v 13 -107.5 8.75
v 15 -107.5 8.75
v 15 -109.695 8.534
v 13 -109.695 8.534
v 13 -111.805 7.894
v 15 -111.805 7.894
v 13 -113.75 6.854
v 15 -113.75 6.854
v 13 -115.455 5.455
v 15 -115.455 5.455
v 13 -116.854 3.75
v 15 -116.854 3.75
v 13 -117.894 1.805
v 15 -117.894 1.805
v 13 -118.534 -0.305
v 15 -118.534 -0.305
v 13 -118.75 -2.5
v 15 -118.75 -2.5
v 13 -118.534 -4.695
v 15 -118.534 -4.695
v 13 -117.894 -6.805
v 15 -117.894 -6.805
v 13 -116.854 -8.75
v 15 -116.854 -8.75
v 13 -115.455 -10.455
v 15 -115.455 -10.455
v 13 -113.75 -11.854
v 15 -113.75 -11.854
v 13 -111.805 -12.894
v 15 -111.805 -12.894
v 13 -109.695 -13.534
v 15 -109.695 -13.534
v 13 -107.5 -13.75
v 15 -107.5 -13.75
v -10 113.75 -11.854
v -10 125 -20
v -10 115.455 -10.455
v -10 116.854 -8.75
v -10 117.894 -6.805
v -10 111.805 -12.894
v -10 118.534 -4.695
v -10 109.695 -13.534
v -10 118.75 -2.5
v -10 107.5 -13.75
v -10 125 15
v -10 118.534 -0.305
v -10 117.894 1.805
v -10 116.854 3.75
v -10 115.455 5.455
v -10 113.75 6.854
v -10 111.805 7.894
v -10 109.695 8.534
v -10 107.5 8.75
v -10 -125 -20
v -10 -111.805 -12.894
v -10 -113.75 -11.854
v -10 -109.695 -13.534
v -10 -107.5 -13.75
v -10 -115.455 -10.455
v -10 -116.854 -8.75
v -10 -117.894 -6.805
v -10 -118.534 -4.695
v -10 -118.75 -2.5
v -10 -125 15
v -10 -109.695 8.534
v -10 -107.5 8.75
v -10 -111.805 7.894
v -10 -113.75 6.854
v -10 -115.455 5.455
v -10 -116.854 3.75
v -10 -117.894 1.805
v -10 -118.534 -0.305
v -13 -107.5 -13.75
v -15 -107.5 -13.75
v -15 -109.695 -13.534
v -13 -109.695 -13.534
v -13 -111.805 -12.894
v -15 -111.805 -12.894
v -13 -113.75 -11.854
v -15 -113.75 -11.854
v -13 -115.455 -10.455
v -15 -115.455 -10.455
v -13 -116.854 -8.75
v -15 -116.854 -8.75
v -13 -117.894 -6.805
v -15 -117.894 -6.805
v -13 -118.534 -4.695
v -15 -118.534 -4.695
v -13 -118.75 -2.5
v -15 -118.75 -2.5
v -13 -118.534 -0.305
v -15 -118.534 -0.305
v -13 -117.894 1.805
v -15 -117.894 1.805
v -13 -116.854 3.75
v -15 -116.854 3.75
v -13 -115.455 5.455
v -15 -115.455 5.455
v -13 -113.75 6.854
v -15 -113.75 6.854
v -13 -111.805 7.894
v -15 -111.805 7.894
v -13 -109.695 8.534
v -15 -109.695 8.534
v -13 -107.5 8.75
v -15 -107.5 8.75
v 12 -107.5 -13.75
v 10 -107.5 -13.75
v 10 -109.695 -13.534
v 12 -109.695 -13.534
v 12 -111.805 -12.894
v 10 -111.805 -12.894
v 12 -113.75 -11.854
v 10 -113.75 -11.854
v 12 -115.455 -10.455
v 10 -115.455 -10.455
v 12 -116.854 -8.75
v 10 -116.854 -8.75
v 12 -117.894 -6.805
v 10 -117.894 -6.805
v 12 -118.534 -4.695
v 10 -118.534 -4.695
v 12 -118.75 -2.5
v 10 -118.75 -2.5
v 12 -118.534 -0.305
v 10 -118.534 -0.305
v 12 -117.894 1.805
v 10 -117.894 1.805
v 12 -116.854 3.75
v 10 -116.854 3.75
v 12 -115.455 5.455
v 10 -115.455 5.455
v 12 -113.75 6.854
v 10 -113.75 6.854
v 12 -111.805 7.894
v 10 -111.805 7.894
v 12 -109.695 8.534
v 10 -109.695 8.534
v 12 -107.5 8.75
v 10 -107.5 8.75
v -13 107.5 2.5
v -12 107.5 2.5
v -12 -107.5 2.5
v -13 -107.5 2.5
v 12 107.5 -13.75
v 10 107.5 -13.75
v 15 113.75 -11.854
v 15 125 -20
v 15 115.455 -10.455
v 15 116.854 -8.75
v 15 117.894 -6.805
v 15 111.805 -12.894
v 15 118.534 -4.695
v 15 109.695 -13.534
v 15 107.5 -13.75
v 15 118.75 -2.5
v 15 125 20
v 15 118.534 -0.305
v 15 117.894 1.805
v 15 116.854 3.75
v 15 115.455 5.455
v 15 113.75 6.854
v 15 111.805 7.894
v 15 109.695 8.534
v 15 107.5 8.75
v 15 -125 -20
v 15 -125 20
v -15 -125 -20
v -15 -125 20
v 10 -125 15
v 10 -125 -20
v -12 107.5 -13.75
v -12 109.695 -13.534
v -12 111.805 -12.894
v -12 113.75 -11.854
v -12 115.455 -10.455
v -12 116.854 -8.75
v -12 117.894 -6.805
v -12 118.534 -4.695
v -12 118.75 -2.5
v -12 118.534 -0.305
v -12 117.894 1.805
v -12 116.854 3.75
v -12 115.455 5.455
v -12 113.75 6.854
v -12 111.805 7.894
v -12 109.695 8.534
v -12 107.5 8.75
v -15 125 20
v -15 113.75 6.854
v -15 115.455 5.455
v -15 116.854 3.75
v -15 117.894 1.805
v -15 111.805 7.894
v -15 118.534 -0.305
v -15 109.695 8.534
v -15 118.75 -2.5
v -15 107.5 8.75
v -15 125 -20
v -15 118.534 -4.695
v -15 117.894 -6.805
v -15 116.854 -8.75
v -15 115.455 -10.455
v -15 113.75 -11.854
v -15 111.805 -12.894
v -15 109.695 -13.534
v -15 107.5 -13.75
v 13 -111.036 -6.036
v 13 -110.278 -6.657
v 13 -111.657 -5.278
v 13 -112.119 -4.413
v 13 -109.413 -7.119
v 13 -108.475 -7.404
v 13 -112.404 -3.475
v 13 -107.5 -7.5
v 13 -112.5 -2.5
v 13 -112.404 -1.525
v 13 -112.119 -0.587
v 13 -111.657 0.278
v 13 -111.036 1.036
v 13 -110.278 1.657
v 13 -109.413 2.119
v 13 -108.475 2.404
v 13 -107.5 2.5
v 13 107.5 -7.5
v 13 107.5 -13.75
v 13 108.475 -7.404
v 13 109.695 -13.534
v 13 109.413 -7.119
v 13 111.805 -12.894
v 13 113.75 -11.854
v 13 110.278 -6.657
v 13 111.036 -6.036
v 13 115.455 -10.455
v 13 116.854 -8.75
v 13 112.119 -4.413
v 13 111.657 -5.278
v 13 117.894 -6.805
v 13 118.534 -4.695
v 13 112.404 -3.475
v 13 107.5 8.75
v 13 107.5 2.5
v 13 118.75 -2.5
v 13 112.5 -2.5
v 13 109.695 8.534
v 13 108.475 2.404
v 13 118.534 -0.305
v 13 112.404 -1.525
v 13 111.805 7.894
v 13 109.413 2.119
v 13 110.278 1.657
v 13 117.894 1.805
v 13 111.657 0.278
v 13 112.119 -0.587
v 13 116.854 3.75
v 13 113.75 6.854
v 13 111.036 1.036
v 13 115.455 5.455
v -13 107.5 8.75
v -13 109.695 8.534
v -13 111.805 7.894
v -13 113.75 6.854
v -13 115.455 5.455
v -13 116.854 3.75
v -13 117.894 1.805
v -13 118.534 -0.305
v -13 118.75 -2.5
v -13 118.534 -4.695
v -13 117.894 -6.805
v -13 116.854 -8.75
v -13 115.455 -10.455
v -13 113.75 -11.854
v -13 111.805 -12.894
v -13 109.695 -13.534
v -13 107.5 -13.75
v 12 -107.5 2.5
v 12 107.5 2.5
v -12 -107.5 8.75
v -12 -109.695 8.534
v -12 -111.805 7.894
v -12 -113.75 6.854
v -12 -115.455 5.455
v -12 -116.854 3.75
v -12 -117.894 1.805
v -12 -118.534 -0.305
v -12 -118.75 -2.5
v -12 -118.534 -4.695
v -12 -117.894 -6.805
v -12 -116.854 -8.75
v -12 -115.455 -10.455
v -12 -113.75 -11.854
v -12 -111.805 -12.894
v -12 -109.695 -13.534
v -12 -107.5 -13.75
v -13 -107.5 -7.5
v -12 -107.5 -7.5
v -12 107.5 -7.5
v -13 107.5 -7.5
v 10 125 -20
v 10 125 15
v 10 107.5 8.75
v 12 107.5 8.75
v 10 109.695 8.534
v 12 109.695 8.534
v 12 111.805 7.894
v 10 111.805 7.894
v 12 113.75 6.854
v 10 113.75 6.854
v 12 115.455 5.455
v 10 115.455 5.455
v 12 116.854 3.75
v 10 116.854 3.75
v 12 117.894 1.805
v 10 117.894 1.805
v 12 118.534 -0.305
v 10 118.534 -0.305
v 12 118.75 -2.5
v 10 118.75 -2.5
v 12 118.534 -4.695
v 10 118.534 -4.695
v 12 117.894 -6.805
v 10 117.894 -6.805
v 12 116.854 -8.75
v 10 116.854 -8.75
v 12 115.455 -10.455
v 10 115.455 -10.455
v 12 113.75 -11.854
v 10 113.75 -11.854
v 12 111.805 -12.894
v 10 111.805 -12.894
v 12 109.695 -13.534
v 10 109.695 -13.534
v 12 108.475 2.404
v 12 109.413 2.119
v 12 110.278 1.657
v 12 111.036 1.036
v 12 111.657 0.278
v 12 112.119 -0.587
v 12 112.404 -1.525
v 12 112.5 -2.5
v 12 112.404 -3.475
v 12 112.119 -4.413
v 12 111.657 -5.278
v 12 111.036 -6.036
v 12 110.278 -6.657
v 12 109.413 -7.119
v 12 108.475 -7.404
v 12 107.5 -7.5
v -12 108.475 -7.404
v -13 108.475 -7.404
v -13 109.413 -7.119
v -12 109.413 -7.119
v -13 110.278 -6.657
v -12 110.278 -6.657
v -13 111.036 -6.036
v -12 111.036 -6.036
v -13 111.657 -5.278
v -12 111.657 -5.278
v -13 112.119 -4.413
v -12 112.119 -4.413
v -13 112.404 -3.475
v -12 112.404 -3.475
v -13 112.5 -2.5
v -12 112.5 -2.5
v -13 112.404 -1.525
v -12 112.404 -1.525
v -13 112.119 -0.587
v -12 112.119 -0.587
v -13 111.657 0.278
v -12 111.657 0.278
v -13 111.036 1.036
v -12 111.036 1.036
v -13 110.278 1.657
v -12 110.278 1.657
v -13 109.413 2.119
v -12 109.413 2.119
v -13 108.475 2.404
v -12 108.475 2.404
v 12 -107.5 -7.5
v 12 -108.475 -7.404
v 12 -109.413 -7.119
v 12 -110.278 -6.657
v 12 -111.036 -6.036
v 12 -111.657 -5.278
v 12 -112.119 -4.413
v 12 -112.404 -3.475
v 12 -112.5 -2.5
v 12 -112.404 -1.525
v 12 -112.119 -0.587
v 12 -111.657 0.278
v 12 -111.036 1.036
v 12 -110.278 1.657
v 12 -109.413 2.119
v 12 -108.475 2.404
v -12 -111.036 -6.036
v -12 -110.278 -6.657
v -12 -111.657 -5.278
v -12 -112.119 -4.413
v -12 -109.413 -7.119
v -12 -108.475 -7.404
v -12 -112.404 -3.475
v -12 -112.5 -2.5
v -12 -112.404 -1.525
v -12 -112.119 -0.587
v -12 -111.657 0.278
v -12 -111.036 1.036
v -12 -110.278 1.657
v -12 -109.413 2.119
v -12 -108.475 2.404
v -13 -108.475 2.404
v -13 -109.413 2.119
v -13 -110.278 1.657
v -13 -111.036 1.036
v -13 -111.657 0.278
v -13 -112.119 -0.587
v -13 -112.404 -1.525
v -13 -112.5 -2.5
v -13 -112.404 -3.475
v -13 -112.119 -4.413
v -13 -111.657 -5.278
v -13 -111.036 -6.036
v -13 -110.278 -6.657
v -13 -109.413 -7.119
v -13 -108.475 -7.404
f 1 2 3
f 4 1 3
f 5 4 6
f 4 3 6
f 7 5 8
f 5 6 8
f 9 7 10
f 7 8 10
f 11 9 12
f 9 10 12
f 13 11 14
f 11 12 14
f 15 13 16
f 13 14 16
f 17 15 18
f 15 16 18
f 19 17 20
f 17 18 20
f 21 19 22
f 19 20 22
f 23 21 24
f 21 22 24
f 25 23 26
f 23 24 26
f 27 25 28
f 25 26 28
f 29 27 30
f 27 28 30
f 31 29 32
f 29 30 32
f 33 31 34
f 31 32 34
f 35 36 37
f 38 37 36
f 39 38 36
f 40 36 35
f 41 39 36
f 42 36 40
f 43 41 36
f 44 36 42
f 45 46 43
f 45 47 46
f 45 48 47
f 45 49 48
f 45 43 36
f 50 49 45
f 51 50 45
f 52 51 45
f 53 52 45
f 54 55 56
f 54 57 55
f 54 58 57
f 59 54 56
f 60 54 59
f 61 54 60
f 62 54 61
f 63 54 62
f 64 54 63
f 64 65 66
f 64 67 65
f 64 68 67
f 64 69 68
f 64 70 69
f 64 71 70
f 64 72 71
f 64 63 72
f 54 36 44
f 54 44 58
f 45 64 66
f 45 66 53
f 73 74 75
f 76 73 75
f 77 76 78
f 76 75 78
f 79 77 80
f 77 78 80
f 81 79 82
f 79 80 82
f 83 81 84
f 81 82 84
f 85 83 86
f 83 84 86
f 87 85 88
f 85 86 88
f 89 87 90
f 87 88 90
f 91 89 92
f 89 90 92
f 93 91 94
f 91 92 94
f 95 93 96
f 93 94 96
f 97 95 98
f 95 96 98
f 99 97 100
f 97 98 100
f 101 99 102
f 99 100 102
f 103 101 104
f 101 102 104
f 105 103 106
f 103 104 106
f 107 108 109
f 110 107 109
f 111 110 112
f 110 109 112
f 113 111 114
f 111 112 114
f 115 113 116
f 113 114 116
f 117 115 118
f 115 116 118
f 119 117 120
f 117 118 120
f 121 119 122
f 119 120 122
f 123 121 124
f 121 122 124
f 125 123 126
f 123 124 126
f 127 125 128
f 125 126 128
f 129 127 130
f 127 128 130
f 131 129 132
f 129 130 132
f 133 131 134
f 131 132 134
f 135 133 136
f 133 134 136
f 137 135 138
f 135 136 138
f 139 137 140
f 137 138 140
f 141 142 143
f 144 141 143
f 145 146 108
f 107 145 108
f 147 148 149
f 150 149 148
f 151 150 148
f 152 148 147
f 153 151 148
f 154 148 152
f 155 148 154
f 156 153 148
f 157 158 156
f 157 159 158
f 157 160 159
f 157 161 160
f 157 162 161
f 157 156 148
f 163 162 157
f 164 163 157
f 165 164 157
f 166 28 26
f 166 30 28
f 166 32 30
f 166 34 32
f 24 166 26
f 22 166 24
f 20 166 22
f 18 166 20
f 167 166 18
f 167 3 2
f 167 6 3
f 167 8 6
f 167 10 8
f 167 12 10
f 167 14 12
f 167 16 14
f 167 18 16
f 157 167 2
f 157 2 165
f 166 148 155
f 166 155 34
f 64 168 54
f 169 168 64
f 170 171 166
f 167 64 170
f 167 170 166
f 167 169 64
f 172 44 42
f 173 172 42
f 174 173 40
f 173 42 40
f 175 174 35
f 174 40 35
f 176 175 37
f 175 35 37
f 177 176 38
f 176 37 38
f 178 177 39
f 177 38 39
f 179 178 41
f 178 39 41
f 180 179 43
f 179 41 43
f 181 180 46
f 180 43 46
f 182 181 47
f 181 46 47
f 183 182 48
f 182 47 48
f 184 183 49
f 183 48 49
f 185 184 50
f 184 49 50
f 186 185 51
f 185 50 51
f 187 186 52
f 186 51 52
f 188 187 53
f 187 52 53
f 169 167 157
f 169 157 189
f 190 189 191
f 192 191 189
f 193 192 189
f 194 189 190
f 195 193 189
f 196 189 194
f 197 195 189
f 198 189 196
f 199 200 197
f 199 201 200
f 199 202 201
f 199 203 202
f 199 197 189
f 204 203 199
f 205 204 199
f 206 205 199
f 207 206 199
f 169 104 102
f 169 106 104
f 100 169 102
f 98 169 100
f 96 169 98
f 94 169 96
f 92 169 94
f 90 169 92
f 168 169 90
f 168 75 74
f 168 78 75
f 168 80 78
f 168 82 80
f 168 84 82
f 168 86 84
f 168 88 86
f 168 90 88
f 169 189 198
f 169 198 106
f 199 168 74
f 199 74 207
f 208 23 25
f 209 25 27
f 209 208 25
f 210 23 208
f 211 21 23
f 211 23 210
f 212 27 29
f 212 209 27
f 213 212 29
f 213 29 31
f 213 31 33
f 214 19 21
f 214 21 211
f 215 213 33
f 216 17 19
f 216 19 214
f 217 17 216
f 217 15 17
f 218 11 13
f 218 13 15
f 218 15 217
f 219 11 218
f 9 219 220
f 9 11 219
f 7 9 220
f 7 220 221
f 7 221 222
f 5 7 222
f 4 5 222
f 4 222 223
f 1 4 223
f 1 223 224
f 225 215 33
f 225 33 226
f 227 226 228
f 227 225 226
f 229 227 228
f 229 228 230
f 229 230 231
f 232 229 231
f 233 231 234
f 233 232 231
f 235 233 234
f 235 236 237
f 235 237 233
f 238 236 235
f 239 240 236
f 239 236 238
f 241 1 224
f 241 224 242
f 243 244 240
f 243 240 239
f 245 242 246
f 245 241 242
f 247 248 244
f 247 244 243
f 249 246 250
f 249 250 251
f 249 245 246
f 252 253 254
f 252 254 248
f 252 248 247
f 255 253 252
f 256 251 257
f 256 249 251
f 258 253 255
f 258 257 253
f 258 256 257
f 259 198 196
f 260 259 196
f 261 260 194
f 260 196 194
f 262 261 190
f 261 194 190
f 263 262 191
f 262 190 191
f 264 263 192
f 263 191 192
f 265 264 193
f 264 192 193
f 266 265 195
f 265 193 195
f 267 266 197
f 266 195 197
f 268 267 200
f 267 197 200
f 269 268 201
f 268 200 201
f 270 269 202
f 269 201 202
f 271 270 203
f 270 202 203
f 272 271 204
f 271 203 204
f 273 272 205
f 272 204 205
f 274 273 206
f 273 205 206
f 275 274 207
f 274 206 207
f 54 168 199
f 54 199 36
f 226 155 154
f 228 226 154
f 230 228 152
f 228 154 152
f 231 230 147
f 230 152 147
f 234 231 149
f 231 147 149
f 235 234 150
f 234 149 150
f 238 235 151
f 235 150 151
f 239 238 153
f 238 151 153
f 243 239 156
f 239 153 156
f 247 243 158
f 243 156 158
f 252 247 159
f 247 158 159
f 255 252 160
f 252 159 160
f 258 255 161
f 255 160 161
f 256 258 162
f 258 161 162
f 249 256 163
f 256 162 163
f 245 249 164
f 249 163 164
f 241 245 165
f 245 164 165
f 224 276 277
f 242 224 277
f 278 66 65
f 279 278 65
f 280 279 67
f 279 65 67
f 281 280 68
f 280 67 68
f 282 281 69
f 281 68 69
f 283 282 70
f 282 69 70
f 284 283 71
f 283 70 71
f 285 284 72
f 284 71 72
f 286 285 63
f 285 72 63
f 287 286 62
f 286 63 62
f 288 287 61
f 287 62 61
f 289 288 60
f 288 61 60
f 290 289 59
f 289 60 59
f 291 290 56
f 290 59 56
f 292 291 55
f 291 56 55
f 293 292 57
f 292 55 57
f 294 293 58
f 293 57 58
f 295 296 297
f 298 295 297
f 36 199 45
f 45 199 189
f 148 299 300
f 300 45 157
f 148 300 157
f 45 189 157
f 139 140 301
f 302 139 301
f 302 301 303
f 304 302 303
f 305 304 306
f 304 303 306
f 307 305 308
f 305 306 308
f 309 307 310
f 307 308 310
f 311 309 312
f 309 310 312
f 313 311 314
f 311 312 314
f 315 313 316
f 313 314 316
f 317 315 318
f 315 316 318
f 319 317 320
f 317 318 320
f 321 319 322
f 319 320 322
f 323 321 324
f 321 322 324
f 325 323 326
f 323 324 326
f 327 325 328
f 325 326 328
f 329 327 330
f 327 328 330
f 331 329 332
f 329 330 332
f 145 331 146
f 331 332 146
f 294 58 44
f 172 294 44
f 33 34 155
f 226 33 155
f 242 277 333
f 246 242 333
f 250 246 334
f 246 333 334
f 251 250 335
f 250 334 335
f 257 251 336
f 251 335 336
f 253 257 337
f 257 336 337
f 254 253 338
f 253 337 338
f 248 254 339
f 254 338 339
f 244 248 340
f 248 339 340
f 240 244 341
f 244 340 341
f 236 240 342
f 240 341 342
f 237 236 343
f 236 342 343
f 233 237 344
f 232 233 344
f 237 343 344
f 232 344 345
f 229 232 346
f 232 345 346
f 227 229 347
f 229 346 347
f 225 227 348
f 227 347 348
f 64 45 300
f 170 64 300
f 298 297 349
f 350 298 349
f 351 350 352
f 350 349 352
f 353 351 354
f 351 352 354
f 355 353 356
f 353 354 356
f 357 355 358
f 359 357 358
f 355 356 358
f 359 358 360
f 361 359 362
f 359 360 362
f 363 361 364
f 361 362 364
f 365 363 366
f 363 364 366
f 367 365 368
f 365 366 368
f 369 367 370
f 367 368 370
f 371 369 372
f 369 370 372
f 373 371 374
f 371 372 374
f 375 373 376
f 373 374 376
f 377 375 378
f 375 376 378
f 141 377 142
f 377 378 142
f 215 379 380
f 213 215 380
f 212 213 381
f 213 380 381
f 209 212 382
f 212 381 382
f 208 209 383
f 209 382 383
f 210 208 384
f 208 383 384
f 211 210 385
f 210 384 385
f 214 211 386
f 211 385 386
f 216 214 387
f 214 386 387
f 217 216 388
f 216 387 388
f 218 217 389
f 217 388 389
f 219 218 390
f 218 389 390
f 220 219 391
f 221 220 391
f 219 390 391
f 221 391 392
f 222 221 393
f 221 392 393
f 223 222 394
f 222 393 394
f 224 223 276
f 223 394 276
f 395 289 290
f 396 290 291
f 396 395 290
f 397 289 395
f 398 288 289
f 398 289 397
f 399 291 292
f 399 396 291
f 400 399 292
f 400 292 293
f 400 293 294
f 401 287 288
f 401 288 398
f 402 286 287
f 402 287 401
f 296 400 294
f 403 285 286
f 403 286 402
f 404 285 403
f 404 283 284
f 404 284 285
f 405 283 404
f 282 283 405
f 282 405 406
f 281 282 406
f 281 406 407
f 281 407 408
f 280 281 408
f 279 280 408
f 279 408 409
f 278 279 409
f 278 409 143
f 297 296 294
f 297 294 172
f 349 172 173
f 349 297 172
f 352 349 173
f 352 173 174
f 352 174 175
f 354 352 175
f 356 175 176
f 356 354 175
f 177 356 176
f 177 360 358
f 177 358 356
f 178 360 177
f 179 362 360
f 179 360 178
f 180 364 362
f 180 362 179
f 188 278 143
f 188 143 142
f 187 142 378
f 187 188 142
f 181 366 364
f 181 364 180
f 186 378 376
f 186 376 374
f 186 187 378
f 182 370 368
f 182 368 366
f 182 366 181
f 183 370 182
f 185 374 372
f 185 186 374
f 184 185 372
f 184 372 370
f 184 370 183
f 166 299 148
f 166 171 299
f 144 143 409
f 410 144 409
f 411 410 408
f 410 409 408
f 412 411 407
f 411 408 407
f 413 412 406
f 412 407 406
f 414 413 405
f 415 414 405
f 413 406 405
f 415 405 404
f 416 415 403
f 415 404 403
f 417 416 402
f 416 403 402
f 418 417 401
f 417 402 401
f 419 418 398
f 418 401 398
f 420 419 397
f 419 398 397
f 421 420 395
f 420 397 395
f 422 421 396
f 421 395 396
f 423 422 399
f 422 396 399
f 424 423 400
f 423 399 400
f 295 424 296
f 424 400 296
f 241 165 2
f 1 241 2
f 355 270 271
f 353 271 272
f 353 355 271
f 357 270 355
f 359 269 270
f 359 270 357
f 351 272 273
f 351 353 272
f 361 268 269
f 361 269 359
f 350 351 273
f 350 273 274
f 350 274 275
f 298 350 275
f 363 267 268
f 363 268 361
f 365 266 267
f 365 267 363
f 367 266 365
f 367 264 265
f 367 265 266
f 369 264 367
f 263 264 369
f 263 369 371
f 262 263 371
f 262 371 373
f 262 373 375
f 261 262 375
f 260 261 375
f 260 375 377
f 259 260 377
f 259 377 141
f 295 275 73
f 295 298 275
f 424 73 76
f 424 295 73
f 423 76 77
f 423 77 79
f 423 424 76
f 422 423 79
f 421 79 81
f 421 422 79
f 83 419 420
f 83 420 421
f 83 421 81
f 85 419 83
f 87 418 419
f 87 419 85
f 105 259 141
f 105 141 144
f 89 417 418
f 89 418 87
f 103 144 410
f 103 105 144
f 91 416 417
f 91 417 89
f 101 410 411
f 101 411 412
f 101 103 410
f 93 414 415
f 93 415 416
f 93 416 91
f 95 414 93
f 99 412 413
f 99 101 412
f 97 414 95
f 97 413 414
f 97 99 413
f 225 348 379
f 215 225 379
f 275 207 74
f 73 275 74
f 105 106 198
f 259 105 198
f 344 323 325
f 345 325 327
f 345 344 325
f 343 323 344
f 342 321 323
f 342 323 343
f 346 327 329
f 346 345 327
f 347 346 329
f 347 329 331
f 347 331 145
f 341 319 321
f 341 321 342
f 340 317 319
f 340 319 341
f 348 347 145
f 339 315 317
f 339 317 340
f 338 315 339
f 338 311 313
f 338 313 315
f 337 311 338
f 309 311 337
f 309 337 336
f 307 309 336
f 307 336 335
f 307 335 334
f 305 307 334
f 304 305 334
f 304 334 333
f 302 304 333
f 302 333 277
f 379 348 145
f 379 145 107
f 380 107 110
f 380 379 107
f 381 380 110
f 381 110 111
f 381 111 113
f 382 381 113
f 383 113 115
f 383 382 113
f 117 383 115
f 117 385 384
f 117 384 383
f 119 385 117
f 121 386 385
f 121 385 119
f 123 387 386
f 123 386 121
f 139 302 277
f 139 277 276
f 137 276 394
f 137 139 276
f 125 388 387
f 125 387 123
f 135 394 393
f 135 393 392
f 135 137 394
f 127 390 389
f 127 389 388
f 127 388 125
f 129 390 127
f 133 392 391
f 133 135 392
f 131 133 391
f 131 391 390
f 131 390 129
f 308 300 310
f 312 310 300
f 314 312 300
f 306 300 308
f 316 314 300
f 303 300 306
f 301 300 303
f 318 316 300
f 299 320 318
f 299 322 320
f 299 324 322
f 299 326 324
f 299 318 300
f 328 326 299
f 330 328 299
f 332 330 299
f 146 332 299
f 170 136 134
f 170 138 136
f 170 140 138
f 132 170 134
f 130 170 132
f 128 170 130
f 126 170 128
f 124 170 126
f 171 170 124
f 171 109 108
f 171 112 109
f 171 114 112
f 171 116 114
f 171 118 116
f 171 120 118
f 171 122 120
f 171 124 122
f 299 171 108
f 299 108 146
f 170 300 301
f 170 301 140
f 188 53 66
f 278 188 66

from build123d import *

# Parameters (mm, degrees)
F1_DEPTH      = 125
F1_DEPTH_BACK = 125
F6_DEPTH      = 5.001
F7_DEPTH      = 30.001
F8_DEPTH      = 2
F9_DEPTH      = 2
F10_DEPTH     = 2
F11_DEPTH     = 2


with BuildPart() as f1:
    # F0 (on Front) → F1 (new body, two sides)
    with BuildSketch(Plane.XZ) as f1_sk:
        Polygon((15, -20), (15, 20), (-15, 20), (-15, -20), (-10, -20), (-10, 15), (10, 15), (10, -20), align=None)
    extrude(amount=F1_DEPTH)
    extrude(f1_sk.sketch, amount=-F1_DEPTH_BACK)

    # F4 (on face) → F6 (cut, through all)
    with BuildSketch(Plane.YZ.offset(-10)):
        with BuildLine():
            Line((107.5, 2.5), (-107.5, 2.5))
            ThreePointArc((-107.5, 2.5), (-112.5, -2.5), (-107.5, -7.5))
            Line((-107.5, -7.5), (107.5, -7.5))
            ThreePointArc((107.5, -7.5), (112.5, -2.5), (107.5, 2.5))
        make_face()
    extrude(amount=-F6_DEPTH, mode=Mode.SUBTRACT)

    # F2 (on face) → F7 (cut, through all)
    with BuildSketch(Plane(origin=(-15, 0, 0), x_dir=(0, -1, 0), z_dir=(-1, 0, 0))):
        with BuildLine():
            Line((-107.5, -7.5), (107.5, -7.5))
            ThreePointArc((107.5, -7.5), (112.5, -2.5), (107.5, 2.5))
            Line((107.5, 2.5), (-107.5, 2.5))
            ThreePointArc((-107.5, 2.5), (-112.5, -2.5), (-107.5, -7.5))
        make_face()
    extrude(amount=-F7_DEPTH, mode=Mode.SUBTRACT)

    # F5 (on face) → F8 (cut)
    with BuildSketch(Plane(origin=(10, 0, 0), x_dir=(0, -1, 0), z_dir=(-1, 0, 0))):
        with BuildLine():
            Line((107.5, 8.75), (-107.5, 8.75))
            ThreePointArc((-107.5, 8.75), (-118.75, -2.5), (-107.5, -13.75))
            Line((-107.5, -13.75), (107.5, -13.75))
            ThreePointArc((107.5, -13.75), (118.75, -2.5), (107.5, 8.75))
        make_face()
        with BuildLine():
            ThreePointArc((-107.5, -7.5), (-112.5, -2.5), (-107.5, 2.5))
            Line((-107.5, 2.5), (107.5, 2.5))
            ThreePointArc((107.5, 2.5), (112.5, -2.5), (107.5, -7.5))
            Line((107.5, -7.5), (-107.5, -7.5))
        make_face(mode=Mode.SUBTRACT)
    extrude(amount=-F8_DEPTH, mode=Mode.SUBTRACT)

    # F4 (on face) → F9 (cut)
    with BuildSketch(Plane.YZ.offset(-10)):
        with BuildLine():
            Line((107.5, 8.75), (-107.5, 8.75))
            ThreePointArc((-107.5, 8.75), (-118.75, -2.5), (-107.5, -13.75))
            Line((-107.5, -13.75), (107.5, -13.75))
            ThreePointArc((107.5, -13.75), (118.75, -2.5), (107.5, 8.75))
        make_face()
        with BuildLine():
            ThreePointArc((-107.5, -7.5), (-112.5, -2.5), (-107.5, 2.5))
            Line((-107.5, 2.5), (107.5, 2.5))
            ThreePointArc((107.5, 2.5), (112.5, -2.5), (107.5, -7.5))
            Line((107.5, -7.5), (-107.5, -7.5))
        make_face(mode=Mode.SUBTRACT)
    extrude(amount=-F9_DEPTH, mode=Mode.SUBTRACT)

    # F3 (on face) → F10 (cut)
    with BuildSketch(Plane.YZ.offset(15)):
        with BuildLine():
            ThreePointArc((-107.5, 8.75), (-118.75, -2.5), (-107.5, -13.75))
            Line((-107.5, -13.75), (107.5, -13.75))
            ThreePointArc((107.5, -13.75), (118.75, -2.5), (107.5, 8.75))
            Line((107.5, 8.75), (-107.5, 8.75))
        make_face()
        with BuildLine():
            ThreePointArc((-107.5, -7.5), (-112.5, -2.5), (-107.5, 2.5))
            Line((-107.5, 2.5), (107.5, 2.5))
            ThreePointArc((107.5, 2.5), (112.5, -2.5), (107.5, -7.5))
            Line((107.5, -7.5), (-107.5, -7.5))
        make_face(mode=Mode.SUBTRACT)
    extrude(amount=-F10_DEPTH, mode=Mode.SUBTRACT)

    # F2 (on face) → F11 (cut)
    with BuildSketch(Plane(origin=(-15, 0, 0), x_dir=(0, -1, 0), z_dir=(-1, 0, 0))):
        with BuildLine():
            Line((-107.5, -13.75), (107.5, -13.75))
            ThreePointArc((107.5, -13.75), (118.75, -2.5), (107.5, 8.75))
            Line((107.5, 8.75), (-107.5, 8.75))
            ThreePointArc((-107.5, 8.75), (-118.75, -2.5), (-107.5, -13.75))
        make_face()
        with BuildLine():
            ThreePointArc((107.5, 2.5), (112.5, -2.5), (107.5, -7.5))
            Line((107.5, -7.5), (-107.5, -7.5))
            ThreePointArc((-107.5, -7.5), (-112.5, -2.5), (-107.5, 2.5))
            Line((-107.5, 2.5), (107.5, 2.5))
        make_face(mode=Mode.SUBTRACT)
    extrude(amount=-F11_DEPTH, mode=Mode.SUBTRACT)


solid = f1.part
